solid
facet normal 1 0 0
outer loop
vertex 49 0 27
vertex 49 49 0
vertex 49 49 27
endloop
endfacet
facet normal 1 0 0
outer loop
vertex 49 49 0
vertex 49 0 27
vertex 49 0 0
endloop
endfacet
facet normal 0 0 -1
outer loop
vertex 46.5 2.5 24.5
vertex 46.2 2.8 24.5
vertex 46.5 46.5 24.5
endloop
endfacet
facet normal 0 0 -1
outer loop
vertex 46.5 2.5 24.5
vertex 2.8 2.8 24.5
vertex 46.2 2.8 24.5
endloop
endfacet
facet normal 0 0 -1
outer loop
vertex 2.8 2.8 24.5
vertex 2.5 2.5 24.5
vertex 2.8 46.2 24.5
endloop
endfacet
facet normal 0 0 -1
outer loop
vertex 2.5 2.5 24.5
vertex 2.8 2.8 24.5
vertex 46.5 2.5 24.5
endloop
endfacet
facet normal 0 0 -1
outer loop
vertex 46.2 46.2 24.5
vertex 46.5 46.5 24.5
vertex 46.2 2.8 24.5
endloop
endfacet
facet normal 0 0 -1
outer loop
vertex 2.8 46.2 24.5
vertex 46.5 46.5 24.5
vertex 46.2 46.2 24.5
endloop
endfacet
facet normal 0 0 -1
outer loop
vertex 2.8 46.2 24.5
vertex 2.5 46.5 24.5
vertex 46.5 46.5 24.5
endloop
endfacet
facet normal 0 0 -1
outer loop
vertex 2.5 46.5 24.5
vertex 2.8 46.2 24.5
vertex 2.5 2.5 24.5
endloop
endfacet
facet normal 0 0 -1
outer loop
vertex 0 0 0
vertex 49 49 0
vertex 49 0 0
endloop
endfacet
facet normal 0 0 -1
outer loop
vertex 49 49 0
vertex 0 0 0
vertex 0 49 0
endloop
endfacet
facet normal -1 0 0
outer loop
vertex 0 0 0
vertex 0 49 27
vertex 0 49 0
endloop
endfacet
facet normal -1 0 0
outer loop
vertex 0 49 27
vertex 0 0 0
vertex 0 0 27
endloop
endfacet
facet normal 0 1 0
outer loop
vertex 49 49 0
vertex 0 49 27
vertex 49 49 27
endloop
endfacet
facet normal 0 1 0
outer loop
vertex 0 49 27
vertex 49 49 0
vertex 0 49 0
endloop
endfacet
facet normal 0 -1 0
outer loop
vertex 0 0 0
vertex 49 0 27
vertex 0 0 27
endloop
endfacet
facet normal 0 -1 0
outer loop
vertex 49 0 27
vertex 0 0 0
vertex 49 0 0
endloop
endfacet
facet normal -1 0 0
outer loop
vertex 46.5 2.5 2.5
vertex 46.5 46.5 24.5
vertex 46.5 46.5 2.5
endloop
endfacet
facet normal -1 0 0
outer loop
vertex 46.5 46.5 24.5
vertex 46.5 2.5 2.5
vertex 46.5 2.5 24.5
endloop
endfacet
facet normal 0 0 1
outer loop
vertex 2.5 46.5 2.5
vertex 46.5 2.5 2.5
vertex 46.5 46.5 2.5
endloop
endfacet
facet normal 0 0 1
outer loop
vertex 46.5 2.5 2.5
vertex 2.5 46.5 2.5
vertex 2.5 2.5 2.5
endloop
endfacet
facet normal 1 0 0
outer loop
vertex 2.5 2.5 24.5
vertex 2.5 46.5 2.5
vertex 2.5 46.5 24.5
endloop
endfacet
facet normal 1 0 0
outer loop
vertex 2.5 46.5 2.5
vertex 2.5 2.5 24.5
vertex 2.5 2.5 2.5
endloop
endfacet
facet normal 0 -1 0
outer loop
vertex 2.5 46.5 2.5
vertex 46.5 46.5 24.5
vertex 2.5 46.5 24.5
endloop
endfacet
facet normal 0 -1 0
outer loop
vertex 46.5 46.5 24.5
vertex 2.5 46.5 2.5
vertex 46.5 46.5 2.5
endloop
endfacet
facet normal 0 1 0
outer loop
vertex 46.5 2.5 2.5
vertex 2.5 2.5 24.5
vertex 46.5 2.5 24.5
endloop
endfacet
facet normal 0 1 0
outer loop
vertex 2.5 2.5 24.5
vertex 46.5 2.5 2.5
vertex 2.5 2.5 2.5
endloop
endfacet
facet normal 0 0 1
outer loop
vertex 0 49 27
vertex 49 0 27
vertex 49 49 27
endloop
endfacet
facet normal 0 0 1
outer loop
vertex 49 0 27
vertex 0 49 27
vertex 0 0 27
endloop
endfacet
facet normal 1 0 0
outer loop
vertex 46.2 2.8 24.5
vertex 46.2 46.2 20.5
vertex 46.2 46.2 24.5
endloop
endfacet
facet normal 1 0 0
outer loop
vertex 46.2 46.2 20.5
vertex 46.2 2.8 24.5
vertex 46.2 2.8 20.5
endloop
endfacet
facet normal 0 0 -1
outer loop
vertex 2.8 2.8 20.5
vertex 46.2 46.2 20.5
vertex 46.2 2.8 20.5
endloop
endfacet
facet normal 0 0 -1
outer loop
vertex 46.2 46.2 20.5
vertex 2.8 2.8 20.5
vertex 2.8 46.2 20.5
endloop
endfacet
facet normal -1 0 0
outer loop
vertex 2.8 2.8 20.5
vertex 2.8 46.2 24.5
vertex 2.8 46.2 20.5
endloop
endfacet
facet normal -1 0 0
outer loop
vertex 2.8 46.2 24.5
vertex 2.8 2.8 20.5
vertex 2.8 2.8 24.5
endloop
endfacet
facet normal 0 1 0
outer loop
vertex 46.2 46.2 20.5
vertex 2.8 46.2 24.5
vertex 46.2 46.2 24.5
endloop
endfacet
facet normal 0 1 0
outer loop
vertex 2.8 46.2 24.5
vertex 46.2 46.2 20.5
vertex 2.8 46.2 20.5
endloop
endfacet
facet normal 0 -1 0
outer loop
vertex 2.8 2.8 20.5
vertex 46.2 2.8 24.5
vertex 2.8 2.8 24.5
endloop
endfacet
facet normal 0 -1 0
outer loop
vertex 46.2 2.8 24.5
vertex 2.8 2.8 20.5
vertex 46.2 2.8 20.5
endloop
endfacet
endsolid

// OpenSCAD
// Two-part 3D-printable enclosure, units: mm

wall = 2.5;
clearance = 0.30;

cavity_x = 44;
cavity_y = 44;
cavity_z = 22;

bottom_thickness = wall;
lid_thickness = wall;
lid_plug_depth = 4;

outer_x = cavity_x + 2 * wall;
outer_y = cavity_y + 2 * wall;
base_h = bottom_thickness + cavity_z;

plug_x = cavity_x - 2 * clearance;
plug_y = cavity_y - 2 * clearance;

module base() {
    difference() {
        cube([outer_x, outer_y, base_h]);
        translate([wall, wall, bottom_thickness])
            cube([cavity_x, cavity_y, cavity_z + 0.2]);
    }
}

module lid() {
    union() {
        translate([0, 0, base_h])
            cube([outer_x, outer_y, lid_thickness]);

        translate([wall + clearance, wall + clearance, base_h - lid_plug_depth])
            cube([plug_x, plug_y, lid_plug_depth]);
    }
}

base();
lid();
